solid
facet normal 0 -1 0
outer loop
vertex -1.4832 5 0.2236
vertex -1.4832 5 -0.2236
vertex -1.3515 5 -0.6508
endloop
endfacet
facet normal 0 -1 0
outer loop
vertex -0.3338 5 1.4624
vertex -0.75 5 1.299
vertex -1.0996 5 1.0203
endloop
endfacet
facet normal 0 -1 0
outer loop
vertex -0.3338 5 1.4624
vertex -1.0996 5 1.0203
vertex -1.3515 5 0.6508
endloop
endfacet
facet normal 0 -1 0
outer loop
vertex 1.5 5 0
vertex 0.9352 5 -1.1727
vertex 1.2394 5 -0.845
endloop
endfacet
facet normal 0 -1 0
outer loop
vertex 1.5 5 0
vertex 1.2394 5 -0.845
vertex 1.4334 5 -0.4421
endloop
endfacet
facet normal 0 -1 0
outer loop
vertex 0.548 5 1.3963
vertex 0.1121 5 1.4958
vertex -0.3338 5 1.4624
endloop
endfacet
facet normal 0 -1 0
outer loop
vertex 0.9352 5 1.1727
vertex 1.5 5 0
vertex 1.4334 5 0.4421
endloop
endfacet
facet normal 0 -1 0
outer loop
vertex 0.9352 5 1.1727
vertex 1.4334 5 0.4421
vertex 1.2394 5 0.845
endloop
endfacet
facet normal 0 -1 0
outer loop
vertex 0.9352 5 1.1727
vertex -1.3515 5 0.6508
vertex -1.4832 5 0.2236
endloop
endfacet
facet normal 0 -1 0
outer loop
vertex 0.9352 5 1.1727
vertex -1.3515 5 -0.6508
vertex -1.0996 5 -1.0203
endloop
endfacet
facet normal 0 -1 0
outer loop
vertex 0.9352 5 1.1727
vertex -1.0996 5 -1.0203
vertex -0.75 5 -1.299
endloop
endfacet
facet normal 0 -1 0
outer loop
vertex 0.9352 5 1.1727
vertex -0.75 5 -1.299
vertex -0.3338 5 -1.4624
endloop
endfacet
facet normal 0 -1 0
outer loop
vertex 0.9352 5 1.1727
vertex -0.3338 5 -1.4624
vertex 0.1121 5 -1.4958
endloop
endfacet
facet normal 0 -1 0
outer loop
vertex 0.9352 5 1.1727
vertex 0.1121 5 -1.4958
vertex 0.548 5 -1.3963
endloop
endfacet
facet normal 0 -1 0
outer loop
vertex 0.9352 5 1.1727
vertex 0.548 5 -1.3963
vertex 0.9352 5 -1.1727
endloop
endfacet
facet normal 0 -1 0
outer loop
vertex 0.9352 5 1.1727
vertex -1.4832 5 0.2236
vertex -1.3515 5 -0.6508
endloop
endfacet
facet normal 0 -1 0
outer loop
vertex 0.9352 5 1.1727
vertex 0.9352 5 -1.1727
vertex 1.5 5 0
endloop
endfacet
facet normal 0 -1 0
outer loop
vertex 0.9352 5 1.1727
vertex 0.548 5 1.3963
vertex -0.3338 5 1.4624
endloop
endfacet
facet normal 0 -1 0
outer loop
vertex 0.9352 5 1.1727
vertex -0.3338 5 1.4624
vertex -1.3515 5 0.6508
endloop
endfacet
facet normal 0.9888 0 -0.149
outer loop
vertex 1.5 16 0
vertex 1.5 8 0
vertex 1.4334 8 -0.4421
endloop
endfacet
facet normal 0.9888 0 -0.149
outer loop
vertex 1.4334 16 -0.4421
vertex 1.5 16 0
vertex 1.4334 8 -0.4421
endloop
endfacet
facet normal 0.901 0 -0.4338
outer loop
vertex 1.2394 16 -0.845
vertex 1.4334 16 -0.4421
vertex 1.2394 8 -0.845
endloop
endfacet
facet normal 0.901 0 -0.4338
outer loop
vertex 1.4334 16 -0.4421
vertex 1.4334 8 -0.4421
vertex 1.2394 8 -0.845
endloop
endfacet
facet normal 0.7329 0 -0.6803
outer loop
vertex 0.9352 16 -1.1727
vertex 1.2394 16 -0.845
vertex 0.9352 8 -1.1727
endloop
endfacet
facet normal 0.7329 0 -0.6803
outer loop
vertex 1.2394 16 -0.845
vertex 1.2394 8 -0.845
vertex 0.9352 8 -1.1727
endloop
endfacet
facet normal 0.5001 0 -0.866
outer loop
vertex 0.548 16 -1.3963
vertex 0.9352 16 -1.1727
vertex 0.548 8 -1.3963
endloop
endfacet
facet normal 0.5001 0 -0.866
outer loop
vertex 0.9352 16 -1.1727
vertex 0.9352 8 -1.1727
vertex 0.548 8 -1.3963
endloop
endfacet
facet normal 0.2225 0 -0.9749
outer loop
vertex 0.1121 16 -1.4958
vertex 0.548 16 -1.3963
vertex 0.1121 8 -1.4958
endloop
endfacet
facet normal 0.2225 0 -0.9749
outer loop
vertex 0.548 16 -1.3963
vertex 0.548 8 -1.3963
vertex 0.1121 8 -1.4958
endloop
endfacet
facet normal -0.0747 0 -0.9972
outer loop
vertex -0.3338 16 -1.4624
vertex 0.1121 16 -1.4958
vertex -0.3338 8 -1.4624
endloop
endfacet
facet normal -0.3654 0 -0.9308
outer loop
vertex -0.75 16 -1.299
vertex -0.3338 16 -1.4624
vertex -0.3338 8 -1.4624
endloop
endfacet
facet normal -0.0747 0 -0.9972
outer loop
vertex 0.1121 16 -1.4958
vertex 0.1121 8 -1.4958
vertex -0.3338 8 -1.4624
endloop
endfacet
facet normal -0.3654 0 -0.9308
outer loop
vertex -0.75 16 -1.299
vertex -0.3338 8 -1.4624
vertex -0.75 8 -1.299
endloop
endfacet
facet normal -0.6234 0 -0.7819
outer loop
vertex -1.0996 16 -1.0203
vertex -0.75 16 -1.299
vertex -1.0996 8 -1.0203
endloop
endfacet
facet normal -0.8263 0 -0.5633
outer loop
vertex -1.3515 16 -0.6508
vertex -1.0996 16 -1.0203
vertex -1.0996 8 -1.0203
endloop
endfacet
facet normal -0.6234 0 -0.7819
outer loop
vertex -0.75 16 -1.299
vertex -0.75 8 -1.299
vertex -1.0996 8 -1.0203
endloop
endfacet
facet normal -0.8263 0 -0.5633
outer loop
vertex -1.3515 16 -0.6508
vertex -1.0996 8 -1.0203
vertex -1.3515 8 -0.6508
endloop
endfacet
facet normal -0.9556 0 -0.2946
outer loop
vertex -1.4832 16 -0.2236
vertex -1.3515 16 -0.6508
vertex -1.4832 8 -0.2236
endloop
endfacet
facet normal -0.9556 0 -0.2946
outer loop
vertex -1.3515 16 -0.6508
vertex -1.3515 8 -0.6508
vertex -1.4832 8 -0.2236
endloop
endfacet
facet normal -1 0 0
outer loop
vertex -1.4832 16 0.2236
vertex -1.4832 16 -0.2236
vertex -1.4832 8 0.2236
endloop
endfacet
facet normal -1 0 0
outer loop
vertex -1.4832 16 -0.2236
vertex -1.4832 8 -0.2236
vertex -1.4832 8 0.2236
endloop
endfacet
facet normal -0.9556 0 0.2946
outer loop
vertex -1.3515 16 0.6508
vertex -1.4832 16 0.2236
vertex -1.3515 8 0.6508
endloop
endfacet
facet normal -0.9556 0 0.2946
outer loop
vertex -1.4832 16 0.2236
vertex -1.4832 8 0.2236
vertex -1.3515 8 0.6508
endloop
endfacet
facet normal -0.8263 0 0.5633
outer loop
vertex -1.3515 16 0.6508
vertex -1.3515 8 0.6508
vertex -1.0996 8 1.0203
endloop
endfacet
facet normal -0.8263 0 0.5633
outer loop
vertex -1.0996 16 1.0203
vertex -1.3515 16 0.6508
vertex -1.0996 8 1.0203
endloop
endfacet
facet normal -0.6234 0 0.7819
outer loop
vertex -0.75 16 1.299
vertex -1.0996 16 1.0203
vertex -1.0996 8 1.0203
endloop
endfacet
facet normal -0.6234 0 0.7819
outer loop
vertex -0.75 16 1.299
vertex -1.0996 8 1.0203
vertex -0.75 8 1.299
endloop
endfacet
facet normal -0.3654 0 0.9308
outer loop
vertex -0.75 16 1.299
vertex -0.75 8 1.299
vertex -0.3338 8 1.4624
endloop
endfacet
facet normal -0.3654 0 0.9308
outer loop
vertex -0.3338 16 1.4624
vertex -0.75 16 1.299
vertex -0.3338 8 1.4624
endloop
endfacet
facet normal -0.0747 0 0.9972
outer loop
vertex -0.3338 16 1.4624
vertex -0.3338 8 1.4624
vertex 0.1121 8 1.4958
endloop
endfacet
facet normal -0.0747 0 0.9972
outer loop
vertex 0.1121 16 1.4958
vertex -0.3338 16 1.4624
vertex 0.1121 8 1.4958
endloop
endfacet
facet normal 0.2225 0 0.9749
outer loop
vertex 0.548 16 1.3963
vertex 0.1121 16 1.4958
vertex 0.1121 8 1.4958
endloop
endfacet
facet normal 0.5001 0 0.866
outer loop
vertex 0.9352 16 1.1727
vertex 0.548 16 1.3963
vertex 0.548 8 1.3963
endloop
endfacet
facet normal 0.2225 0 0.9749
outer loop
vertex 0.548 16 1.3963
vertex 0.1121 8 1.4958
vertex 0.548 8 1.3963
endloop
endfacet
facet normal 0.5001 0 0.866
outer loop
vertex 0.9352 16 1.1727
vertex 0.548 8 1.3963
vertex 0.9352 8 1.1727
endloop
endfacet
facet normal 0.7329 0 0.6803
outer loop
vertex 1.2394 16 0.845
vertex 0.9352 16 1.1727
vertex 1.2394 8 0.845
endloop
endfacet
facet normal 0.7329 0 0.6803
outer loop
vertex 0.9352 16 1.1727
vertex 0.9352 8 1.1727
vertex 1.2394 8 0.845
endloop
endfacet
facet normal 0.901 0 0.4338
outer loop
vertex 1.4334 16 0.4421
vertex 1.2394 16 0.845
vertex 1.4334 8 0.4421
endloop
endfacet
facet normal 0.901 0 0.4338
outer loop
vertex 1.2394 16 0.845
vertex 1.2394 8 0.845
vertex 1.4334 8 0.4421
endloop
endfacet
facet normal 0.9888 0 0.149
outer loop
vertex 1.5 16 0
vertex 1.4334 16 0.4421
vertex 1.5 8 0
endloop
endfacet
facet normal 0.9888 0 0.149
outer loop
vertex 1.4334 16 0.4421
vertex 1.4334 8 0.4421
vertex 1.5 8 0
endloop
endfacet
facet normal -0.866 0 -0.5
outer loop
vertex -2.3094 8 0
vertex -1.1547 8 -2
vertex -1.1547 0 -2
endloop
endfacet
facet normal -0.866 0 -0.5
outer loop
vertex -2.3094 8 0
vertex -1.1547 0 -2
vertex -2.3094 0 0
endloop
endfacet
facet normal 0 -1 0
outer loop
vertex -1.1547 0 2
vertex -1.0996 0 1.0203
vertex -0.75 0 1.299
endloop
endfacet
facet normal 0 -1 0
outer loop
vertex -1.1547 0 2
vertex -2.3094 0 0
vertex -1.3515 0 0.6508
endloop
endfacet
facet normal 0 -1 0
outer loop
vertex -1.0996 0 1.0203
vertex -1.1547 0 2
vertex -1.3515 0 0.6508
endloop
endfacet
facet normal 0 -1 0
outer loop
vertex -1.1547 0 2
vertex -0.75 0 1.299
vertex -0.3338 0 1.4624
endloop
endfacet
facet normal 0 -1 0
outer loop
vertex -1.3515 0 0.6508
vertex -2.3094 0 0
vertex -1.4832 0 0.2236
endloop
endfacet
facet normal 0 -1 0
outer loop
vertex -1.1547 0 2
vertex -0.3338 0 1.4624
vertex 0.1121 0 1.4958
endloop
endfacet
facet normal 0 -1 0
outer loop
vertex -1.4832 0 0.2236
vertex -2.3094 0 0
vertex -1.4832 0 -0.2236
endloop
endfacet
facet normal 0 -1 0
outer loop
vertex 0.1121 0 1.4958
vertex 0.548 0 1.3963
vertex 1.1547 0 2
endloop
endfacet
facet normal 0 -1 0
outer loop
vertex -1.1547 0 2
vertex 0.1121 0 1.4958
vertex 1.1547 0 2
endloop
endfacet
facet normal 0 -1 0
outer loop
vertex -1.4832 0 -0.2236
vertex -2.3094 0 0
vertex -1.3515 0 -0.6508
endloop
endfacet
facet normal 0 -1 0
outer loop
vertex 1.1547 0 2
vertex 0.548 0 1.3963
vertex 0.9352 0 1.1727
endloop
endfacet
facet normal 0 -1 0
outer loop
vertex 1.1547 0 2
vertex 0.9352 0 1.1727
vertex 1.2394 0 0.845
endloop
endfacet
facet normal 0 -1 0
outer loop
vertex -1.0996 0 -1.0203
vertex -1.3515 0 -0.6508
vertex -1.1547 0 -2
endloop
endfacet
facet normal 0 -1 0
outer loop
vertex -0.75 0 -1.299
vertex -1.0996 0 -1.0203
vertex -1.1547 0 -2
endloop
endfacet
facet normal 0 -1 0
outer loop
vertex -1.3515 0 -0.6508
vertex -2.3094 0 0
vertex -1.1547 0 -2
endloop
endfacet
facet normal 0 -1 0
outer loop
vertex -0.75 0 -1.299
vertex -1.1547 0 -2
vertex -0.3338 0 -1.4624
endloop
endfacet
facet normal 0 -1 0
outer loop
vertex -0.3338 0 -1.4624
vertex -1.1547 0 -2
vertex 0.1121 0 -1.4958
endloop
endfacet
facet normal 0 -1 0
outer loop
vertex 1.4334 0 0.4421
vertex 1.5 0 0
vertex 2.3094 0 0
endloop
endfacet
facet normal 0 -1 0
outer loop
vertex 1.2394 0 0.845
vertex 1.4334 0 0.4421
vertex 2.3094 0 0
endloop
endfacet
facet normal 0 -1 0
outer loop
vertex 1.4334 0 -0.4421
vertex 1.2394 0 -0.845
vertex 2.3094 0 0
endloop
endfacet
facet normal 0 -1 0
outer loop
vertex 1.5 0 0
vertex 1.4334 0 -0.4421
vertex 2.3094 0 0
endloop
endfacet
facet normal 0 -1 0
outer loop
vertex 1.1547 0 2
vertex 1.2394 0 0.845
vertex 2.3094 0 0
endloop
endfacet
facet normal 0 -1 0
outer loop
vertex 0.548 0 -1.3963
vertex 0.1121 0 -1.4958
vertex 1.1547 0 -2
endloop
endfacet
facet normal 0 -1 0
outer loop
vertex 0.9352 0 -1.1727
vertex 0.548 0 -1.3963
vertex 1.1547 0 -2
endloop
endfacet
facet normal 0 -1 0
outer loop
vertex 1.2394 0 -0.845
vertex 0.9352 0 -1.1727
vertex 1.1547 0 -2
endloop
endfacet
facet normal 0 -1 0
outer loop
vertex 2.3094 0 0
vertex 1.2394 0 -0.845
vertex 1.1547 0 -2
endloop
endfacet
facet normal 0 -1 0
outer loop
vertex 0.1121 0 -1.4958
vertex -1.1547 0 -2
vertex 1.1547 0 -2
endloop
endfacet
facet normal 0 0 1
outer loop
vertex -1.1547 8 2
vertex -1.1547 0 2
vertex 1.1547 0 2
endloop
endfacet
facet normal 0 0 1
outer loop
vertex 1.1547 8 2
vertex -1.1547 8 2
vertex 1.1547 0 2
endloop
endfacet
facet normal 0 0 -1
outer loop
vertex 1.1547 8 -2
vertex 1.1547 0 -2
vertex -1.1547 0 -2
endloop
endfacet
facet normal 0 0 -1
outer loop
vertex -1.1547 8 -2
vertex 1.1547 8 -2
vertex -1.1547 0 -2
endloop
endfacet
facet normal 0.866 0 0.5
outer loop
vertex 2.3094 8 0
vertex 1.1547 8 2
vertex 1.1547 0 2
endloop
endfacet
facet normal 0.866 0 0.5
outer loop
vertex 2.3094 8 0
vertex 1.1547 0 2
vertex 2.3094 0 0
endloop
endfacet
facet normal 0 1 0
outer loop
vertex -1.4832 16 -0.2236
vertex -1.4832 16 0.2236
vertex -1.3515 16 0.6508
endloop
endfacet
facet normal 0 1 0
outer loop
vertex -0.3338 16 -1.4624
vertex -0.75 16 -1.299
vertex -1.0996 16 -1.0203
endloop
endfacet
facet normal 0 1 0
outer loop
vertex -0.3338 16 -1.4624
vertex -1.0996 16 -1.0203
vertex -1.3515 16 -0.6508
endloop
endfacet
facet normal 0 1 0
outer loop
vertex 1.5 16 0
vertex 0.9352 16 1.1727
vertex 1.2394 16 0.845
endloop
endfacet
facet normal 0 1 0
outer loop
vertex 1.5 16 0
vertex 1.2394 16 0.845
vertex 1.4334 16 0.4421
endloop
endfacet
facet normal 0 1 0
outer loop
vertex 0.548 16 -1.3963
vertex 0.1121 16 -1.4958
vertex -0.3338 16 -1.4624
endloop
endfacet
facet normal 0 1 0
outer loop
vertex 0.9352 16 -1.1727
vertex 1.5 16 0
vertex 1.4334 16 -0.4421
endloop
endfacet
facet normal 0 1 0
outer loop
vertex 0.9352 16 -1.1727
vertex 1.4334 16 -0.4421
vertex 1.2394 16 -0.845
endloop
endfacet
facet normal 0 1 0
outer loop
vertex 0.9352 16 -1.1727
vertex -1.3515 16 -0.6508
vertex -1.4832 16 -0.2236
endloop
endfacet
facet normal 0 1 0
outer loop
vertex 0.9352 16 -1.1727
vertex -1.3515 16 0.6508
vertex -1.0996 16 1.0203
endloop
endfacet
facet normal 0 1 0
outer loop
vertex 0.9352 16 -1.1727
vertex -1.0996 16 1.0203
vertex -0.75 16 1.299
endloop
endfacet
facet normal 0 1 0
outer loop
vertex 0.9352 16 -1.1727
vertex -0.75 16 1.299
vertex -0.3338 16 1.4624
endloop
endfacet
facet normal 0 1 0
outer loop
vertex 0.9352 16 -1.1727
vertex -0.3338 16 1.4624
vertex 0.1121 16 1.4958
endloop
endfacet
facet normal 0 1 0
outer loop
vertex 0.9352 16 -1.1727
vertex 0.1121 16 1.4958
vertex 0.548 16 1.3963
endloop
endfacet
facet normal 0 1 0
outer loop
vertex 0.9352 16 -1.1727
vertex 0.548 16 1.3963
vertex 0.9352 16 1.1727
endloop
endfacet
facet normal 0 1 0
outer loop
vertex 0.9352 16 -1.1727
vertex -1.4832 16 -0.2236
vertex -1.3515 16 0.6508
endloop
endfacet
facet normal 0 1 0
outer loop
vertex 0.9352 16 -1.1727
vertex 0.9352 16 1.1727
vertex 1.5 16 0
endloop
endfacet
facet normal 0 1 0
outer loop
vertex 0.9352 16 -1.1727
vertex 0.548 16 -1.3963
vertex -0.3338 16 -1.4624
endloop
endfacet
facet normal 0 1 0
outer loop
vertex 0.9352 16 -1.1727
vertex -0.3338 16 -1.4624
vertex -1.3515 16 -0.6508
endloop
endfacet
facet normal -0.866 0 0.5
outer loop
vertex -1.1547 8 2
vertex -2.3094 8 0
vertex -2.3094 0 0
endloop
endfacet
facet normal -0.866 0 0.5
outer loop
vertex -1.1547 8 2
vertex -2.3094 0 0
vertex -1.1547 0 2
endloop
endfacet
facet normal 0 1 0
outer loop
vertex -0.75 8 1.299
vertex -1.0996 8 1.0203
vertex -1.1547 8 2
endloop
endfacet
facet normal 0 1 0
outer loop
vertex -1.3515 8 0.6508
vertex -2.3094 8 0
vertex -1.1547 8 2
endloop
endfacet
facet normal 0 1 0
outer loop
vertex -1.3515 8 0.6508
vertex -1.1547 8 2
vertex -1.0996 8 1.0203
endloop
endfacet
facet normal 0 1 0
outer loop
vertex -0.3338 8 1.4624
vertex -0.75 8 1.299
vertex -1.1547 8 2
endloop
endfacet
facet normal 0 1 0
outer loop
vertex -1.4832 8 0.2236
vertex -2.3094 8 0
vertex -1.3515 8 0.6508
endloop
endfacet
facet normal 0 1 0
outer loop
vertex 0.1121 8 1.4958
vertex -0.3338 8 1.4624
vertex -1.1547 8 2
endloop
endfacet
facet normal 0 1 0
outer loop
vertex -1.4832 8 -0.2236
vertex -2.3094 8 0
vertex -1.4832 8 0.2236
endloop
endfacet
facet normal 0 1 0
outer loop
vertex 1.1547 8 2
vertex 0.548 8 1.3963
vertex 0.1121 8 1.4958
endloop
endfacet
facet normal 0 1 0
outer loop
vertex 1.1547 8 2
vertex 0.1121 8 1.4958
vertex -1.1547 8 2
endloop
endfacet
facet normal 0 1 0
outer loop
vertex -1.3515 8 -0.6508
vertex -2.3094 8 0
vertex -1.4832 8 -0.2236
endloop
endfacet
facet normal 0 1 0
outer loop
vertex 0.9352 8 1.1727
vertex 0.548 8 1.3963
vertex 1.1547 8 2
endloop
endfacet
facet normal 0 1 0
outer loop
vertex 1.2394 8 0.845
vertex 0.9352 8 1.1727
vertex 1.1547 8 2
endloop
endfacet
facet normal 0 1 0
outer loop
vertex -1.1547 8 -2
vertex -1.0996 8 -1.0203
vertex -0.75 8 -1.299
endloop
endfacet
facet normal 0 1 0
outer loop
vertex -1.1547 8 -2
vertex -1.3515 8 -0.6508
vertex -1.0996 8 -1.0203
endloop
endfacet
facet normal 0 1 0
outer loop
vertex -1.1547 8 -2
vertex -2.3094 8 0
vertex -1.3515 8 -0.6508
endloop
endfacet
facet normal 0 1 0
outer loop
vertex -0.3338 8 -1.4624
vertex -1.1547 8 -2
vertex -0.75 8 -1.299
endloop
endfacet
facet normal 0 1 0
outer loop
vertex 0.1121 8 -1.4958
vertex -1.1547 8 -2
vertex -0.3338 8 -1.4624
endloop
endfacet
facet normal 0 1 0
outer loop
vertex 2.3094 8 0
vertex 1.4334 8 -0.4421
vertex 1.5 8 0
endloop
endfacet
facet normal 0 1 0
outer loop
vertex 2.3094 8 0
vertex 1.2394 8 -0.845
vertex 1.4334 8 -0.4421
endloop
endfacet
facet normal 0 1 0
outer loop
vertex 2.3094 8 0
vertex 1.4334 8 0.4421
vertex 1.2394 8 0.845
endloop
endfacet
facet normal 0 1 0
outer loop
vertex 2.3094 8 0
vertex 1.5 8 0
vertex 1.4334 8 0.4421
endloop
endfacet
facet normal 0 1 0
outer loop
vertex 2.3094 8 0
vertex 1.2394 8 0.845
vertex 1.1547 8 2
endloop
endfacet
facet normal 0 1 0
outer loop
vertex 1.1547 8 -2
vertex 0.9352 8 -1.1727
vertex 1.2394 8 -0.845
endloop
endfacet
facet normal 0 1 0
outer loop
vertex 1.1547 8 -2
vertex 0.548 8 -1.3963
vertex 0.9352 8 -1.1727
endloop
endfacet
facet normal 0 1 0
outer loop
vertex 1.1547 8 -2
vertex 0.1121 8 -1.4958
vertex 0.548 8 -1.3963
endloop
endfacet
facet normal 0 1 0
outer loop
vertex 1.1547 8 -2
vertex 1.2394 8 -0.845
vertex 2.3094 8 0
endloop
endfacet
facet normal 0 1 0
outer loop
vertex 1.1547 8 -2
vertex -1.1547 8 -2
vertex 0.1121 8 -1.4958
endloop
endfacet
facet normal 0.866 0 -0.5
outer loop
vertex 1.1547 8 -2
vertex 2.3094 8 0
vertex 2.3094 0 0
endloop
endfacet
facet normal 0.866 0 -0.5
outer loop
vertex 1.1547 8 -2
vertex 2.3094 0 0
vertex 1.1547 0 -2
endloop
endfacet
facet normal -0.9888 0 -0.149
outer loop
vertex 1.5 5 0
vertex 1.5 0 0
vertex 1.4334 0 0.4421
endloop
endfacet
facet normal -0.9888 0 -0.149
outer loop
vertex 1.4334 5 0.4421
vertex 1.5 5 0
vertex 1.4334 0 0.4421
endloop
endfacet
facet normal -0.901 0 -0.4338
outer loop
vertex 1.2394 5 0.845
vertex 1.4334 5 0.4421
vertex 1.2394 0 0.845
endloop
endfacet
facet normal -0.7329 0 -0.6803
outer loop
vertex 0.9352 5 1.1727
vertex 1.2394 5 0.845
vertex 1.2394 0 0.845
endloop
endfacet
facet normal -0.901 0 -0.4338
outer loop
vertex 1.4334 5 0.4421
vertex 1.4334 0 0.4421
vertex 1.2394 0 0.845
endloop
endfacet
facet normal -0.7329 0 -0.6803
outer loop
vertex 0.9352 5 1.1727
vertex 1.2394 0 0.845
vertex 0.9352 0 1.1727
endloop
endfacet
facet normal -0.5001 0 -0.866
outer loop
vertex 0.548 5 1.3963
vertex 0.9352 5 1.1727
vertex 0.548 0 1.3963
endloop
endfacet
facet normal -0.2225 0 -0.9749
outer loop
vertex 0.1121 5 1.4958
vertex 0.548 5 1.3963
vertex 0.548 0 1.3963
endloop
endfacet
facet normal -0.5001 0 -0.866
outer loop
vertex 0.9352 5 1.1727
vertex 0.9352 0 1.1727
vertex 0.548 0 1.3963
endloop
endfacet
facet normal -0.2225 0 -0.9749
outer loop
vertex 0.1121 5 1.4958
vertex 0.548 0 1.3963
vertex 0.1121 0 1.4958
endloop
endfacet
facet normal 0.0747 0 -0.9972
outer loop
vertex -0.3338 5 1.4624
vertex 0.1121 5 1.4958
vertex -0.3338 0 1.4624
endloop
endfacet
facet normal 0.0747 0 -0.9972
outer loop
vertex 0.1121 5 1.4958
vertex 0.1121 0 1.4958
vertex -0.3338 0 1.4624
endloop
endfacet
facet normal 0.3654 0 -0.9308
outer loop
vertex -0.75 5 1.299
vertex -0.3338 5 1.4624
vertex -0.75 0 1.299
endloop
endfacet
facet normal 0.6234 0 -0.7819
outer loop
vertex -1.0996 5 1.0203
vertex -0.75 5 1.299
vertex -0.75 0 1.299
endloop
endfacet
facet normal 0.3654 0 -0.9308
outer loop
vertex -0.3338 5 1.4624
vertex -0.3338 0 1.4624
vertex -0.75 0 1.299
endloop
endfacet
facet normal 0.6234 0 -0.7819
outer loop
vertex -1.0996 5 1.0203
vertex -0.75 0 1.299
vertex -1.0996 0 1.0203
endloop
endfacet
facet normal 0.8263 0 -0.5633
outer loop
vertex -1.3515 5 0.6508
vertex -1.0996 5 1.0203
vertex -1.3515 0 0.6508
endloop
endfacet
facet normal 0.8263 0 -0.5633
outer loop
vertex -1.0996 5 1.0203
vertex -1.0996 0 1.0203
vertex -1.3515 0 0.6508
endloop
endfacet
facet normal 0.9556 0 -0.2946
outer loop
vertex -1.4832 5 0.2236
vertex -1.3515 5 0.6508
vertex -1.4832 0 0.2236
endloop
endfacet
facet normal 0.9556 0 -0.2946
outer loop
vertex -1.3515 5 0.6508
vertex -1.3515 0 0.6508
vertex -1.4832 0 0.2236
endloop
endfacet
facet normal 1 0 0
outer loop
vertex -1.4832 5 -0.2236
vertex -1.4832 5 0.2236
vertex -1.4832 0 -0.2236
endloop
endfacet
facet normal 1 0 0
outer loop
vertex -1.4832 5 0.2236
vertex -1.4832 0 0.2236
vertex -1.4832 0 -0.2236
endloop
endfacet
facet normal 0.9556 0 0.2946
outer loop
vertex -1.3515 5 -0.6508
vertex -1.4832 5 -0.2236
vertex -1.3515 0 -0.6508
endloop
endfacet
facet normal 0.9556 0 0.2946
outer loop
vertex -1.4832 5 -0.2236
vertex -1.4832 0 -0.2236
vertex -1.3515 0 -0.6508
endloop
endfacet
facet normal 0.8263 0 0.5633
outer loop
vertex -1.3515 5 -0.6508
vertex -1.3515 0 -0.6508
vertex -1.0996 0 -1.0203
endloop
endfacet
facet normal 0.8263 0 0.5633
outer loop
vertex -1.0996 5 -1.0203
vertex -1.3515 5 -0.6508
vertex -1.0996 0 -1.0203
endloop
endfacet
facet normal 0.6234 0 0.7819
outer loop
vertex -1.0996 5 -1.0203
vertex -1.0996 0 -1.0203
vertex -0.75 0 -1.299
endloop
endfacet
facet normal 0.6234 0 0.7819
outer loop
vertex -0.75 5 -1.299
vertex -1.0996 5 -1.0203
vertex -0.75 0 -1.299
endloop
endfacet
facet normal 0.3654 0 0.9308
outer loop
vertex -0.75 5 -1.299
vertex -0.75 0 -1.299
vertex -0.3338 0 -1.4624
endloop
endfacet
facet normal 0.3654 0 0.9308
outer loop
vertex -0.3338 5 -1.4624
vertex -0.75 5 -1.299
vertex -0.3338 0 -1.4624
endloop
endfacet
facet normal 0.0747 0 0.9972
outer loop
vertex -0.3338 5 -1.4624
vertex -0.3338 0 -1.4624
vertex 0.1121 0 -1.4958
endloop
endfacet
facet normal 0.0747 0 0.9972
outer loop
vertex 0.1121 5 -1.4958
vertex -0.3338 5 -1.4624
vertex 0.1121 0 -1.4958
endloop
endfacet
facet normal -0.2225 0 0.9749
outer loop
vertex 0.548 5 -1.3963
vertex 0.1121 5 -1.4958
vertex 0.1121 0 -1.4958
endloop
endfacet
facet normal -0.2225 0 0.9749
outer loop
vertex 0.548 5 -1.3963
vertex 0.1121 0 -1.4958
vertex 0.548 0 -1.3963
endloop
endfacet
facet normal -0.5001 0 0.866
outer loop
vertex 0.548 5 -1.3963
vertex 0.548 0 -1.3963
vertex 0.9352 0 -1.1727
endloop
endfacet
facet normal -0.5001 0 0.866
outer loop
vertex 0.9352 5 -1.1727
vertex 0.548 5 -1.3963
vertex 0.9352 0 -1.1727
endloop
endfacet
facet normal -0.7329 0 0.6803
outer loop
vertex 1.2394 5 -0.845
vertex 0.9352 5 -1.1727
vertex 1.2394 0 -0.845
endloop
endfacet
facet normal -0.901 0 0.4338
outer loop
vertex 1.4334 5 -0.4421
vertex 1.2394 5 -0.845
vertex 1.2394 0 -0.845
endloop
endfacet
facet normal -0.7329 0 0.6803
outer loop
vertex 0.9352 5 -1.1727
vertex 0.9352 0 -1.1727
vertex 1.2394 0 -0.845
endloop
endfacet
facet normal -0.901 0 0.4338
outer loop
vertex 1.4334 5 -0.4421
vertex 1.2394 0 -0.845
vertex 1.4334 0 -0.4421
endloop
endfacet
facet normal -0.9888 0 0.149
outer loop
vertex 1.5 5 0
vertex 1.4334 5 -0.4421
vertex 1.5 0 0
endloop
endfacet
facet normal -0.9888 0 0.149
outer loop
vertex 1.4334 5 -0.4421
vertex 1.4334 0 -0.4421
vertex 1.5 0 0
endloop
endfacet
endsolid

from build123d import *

# Parameters (mm, degrees)
EXTRUDE_1_DEPTH     = 8
SKETCH_2_R          = 1.5
EXTRUDE_2_DEPTH     = 8
SKETCH_3_R          = 1.5
CUT_EXTRUDE_1_DEPTH = 5


with BuildPart() as part:
    # 草图1 → 凸台-拉伸1 (new body)
    with BuildSketch(Plane(origin=(0, 0, 0), x_dir=(1, 0, 0), z_dir=(0, 1, 0))):
        Polygon((-1.154700538, -2), (1.154700538, -2), (2.309401077, 0), (1.154700538, 2), (-1.154700538, 2), (-2.309401077, 0), align=None)
    extrude(amount=EXTRUDE_1_DEPTH)

    # 草图2 → 凸台-拉伸2 (add)
    with BuildSketch(Plane(origin=(0, 8, 0), x_dir=(1, 0, 0), z_dir=(0, 1, 0))):
        Circle(SKETCH_2_R)
    extrude(amount=EXTRUDE_2_DEPTH)

    # 草图3 → 切除-拉伸1 (cut)
    with BuildSketch(Plane.XZ):
        Circle(SKETCH_3_R)
    extrude(amount=-CUT_EXTRUDE_1_DEPTH, mode=Mode.SUBTRACT)


solid = part.part
